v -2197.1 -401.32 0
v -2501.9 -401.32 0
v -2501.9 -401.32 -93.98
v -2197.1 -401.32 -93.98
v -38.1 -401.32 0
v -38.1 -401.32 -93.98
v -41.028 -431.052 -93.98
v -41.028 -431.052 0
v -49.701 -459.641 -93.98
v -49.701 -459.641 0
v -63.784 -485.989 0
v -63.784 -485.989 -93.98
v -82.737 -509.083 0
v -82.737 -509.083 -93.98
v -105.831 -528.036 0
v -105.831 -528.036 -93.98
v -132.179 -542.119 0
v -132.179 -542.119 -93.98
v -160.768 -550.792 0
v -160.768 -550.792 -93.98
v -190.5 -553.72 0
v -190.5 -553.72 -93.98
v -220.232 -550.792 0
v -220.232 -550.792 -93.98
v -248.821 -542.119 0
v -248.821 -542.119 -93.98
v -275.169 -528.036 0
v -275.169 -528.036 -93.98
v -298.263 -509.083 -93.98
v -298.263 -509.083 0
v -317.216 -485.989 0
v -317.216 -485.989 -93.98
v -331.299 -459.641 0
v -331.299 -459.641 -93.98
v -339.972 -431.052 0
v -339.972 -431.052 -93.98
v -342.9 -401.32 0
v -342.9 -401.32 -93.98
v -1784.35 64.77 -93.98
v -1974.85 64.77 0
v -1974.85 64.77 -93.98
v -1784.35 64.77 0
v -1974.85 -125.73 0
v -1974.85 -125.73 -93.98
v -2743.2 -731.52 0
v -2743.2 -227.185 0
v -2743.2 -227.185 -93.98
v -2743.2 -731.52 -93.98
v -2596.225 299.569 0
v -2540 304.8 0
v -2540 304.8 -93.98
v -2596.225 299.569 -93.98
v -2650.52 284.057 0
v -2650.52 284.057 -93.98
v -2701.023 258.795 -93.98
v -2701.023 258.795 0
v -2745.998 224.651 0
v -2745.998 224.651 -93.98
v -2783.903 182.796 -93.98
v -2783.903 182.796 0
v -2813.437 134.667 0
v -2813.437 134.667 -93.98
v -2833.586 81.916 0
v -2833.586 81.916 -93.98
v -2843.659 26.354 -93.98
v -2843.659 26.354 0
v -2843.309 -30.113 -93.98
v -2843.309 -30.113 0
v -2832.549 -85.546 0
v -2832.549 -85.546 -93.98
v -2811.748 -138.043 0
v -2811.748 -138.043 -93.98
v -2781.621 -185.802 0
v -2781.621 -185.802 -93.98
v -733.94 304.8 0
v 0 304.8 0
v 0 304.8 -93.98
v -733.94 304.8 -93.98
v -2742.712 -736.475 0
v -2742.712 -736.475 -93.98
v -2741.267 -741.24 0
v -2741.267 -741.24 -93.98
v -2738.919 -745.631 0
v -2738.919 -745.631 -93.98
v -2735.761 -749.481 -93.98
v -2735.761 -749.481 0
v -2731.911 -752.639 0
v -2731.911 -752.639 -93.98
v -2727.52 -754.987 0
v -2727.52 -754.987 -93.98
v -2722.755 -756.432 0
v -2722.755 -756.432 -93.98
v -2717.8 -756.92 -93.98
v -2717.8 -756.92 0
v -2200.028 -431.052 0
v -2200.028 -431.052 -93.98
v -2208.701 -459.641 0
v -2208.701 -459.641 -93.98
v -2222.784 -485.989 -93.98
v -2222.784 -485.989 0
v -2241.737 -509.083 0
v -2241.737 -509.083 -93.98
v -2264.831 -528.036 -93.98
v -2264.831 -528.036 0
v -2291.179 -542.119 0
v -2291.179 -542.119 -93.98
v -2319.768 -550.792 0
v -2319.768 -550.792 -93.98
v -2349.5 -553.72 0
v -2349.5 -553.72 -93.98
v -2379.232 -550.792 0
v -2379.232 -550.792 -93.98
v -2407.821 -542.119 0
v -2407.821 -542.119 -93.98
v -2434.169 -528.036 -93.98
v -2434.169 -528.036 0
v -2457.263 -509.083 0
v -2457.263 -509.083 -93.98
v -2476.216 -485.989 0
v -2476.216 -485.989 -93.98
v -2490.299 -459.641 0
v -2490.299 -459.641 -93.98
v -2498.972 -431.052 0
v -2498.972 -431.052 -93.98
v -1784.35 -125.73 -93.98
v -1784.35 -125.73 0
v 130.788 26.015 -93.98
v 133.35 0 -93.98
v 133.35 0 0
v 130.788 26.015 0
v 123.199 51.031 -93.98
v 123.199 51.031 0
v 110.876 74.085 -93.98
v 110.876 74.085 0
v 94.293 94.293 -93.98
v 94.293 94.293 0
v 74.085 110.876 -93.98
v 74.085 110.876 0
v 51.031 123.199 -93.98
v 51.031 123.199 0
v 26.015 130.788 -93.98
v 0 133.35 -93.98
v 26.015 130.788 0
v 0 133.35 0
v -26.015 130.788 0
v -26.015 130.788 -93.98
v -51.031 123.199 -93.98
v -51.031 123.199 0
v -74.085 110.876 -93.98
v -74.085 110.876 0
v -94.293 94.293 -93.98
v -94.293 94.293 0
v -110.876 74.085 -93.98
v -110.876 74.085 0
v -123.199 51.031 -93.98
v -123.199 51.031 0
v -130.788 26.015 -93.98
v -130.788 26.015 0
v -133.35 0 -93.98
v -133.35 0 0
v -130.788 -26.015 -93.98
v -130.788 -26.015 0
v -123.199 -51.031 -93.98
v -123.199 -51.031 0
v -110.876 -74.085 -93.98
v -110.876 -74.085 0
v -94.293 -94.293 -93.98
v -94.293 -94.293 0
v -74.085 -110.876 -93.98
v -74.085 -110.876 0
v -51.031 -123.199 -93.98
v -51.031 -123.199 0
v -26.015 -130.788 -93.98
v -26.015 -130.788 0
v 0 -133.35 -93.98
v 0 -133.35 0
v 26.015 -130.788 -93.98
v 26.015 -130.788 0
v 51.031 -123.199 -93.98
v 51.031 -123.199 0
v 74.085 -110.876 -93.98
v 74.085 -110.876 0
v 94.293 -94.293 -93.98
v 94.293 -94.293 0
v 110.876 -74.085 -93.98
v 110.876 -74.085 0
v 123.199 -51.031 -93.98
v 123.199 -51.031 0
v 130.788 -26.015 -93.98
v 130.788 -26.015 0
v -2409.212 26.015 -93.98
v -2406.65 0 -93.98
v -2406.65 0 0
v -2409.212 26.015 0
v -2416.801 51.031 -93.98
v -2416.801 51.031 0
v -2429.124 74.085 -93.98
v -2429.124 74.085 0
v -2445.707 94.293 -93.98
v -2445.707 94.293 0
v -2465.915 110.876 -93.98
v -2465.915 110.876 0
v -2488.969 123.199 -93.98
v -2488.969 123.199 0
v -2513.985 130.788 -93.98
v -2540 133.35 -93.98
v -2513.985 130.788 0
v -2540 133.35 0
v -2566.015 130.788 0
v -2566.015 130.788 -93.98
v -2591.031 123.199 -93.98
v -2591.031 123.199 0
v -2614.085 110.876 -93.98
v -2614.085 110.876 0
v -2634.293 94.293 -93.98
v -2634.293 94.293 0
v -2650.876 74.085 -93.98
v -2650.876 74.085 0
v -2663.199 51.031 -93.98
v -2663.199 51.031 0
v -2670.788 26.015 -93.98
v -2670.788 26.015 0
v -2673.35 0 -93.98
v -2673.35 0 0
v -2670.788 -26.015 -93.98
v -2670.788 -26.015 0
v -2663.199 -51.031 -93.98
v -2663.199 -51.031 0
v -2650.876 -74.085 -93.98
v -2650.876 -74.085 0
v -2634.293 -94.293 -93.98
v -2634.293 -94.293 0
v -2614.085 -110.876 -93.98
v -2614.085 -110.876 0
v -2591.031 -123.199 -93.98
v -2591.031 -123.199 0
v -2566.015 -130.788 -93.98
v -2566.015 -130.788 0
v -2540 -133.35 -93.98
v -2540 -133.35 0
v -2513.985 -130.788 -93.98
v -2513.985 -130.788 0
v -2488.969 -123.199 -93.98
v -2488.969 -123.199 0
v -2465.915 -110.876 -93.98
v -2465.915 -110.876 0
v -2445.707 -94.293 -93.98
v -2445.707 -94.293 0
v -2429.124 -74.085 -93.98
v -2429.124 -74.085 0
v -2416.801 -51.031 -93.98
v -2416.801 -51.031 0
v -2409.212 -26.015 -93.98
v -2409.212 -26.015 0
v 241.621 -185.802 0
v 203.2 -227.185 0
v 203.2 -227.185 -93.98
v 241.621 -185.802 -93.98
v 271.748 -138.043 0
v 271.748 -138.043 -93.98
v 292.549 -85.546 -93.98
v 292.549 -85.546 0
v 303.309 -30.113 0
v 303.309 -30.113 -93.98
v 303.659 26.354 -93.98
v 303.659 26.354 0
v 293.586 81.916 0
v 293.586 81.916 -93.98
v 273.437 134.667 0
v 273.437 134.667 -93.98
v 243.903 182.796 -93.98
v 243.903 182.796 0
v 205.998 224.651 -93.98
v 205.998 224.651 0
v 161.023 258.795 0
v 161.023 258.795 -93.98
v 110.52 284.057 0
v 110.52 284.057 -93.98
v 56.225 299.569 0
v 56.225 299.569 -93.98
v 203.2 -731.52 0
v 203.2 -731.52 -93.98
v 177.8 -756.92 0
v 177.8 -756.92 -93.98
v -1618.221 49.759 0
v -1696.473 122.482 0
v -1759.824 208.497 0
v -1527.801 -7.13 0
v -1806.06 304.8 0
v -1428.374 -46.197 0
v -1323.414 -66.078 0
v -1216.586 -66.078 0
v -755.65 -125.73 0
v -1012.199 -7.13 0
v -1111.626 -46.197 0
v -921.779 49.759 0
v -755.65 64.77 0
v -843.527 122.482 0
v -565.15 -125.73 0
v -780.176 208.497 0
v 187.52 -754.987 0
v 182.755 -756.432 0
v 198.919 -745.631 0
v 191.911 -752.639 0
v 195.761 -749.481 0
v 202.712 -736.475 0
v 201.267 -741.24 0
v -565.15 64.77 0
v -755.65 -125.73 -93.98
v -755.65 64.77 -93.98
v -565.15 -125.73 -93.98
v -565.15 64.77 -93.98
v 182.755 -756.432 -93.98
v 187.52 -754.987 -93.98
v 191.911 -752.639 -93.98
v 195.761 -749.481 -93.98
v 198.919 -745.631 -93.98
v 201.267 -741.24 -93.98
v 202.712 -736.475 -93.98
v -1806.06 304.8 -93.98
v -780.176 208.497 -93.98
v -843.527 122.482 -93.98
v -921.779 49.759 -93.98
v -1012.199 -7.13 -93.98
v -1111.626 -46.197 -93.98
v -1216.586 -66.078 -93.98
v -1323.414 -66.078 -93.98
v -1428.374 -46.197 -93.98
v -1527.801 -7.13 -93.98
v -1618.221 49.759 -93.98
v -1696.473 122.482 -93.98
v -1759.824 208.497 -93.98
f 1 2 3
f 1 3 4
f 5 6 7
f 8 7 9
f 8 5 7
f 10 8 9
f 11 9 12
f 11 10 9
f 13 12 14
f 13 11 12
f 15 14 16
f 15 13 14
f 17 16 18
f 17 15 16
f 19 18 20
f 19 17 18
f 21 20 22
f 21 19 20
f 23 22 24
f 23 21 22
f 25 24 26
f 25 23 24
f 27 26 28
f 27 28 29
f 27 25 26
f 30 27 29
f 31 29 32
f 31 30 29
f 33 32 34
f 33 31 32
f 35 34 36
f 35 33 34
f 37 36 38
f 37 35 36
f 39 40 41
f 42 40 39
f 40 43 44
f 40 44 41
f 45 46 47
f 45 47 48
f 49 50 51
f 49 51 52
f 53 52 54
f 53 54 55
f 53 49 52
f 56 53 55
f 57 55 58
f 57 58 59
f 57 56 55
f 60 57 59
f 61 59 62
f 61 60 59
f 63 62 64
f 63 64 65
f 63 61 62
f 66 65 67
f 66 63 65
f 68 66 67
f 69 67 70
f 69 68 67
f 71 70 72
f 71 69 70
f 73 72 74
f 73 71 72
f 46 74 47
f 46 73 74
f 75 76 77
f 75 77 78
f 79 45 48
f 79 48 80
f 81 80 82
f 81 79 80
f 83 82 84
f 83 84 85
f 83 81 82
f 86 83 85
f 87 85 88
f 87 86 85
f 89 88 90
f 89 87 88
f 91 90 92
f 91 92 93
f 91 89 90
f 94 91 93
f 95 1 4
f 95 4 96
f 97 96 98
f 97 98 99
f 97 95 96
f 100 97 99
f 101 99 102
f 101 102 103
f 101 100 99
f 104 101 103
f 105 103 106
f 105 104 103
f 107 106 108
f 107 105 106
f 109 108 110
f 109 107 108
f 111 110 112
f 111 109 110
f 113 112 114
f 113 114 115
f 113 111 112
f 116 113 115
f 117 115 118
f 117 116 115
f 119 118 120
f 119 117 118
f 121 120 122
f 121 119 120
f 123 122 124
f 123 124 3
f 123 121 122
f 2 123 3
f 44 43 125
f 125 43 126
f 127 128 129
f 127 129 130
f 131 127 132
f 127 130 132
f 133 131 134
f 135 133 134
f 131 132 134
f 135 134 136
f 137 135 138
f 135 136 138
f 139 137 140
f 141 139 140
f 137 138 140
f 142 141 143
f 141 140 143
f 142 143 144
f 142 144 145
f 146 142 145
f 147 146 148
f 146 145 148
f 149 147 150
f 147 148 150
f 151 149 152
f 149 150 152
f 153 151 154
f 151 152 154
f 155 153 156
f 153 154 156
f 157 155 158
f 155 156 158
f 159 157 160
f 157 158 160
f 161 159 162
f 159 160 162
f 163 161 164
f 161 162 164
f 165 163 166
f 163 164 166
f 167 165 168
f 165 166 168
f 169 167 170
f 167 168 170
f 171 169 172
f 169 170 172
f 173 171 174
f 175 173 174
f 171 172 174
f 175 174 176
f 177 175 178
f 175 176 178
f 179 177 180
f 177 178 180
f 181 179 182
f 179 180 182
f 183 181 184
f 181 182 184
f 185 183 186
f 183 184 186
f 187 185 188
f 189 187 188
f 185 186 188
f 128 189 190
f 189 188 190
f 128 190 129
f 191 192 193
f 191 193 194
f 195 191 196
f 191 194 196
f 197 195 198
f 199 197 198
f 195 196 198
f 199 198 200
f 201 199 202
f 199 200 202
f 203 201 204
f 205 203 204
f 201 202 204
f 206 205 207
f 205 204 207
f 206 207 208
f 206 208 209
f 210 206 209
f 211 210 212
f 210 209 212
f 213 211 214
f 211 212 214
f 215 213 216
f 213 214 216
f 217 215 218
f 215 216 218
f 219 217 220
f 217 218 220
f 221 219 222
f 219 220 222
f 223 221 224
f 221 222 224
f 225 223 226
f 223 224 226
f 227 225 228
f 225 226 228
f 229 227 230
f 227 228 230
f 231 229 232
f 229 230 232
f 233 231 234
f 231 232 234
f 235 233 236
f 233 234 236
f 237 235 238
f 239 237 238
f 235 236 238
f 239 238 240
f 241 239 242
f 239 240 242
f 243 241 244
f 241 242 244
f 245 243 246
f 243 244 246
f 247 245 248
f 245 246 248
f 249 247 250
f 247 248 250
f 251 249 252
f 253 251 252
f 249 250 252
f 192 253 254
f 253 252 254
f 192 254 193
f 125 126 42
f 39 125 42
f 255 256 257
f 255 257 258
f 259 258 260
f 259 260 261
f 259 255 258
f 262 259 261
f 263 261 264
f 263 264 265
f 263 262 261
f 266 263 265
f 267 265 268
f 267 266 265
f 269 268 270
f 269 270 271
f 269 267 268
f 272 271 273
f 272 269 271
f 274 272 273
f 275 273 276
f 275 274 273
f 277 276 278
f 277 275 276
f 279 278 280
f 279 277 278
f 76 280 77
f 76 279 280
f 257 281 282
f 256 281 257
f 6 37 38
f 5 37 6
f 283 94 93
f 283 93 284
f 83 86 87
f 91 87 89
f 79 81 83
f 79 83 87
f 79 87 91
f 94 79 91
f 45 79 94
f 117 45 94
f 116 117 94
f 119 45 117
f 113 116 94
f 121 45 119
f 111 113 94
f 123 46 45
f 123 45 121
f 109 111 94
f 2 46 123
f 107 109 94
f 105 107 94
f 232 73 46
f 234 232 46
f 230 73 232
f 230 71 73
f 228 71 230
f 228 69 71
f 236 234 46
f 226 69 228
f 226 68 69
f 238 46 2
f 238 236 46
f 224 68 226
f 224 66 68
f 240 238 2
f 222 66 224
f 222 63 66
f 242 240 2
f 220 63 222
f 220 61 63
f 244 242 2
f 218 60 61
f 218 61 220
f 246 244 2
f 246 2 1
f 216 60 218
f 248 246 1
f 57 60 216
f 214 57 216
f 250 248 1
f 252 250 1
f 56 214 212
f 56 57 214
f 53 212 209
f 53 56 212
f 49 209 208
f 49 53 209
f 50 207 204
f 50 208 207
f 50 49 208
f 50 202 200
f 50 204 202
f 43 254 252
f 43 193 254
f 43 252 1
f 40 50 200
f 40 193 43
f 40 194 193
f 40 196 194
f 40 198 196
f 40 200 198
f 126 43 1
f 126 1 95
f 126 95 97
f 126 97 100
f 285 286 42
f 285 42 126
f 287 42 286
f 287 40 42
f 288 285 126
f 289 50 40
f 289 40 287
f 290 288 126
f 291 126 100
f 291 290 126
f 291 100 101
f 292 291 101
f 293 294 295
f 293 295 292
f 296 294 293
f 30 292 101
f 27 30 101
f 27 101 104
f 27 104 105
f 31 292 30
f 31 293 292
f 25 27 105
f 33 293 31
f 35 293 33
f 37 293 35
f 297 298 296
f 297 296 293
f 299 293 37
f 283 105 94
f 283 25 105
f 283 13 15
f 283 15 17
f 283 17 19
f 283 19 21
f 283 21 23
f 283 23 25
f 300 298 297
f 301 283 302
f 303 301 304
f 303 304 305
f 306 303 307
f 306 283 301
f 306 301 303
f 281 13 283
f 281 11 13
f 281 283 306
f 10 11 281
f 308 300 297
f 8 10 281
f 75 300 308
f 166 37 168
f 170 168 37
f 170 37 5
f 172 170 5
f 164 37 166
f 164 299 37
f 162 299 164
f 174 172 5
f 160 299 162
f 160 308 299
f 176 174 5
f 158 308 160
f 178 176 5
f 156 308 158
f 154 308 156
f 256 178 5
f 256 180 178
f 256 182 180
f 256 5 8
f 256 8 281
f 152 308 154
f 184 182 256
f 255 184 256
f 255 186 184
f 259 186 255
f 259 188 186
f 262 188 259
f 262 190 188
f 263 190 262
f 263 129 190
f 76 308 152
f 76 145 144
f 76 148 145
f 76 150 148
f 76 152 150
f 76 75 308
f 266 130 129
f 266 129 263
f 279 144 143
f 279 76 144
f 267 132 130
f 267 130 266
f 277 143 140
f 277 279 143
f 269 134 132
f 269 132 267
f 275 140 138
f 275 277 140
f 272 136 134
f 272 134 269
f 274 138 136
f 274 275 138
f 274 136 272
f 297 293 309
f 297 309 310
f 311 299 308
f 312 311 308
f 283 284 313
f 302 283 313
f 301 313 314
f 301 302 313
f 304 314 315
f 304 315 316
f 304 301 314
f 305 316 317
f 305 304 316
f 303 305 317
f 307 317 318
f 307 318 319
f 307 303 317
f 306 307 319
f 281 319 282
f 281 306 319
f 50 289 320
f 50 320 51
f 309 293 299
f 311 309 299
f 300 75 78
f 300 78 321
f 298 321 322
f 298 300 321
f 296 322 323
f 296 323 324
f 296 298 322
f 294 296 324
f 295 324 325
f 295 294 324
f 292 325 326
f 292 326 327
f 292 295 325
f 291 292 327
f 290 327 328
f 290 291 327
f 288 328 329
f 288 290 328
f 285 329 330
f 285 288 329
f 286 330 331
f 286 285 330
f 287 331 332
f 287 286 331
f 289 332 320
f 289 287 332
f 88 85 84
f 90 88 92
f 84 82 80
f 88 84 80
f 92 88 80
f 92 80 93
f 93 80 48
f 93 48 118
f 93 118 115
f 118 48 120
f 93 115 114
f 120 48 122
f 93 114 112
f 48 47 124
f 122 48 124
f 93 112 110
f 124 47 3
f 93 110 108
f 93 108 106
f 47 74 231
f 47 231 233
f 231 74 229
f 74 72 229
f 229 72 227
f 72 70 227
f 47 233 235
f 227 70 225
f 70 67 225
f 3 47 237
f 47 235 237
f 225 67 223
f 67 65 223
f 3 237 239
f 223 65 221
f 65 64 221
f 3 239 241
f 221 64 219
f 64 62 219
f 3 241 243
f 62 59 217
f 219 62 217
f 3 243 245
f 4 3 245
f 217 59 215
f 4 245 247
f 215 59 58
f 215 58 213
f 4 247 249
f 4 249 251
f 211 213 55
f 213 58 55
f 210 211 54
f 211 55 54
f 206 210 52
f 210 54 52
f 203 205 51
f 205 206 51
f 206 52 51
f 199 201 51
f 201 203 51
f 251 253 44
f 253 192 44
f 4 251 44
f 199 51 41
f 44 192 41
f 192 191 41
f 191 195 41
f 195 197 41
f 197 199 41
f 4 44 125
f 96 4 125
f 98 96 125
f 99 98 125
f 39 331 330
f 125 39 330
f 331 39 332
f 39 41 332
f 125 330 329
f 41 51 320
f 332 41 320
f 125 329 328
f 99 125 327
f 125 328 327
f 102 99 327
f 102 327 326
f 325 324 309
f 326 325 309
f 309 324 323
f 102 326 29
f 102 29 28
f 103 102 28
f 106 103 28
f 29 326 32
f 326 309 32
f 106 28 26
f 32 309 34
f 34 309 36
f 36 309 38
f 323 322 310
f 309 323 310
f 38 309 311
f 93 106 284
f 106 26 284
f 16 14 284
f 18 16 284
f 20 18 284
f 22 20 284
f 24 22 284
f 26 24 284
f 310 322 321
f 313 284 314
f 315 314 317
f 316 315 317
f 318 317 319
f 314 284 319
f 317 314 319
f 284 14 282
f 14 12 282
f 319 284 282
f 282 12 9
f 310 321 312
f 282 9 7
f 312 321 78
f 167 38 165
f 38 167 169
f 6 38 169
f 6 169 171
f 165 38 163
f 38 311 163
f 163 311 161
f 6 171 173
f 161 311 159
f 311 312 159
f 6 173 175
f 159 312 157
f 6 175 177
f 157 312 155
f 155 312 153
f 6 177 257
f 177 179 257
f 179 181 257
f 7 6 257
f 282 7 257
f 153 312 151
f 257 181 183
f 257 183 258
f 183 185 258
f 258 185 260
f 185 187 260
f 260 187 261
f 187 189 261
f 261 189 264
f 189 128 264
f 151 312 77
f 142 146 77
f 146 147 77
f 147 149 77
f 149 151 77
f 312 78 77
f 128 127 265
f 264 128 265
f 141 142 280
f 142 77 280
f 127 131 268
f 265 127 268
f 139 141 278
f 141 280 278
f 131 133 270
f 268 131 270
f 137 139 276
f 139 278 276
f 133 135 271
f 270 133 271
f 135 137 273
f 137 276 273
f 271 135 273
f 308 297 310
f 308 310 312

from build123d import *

# Parameters (mm, degrees)
SKETCH1_R           = 133.35
SKETCH1_W           = 190.5
SKETCH1_H           = 190.5
BOSS_EXTRUDE1_DEPTH = 93.98


with BuildPart() as part:
    # Sketch1 → Boss-Extrude1 (new body)
    with BuildSketch(Plane.XY):
        with BuildLine():
            Line((-2743.2, -227.184506514), (-2743.2, -731.52))
            ThreePointArc((-2743.2, -731.52), (-2735.760512242, -749.480512242), (-2717.8, -756.92))
            Line((-2717.8, -756.92), (-2540, -756.92))
            Line((-2540, -756.92), (177.8, -756.92))
            ThreePointArc((177.8, -756.92), (195.760512242, -749.480512242), (203.2, -731.52))
            Line((203.2, -731.52), (203.2, -227.184506514))
            ThreePointArc((203.2, -227.184506514), (284.735735012, 108.759372963), (0, 304.8))
            Line((0, 304.8), (-733.939634369, 304.8))
            ThreePointArc((-733.939634369, 304.8), (-1270, -68.58), (-1806.060365631, 304.8))
            Line((-1806.060365631, 304.8), (-2540, 304.8))
            ThreePointArc((-2540, 304.8), (-2824.735735012, 108.759372963), (-2743.2, -227.184506514))
        make_face()
        with BuildLine():
            Line((-2501.9, -401.32), (-2197.1, -401.32))
            ThreePointArc((-2197.1, -401.32), (-2349.5, -553.72), (-2501.9, -401.32))
        make_face(mode=Mode.SUBTRACT)
        with BuildLine():
            Line((-342.9, -401.32), (-38.1, -401.32))
            ThreePointArc((-38.1, -401.32), (-190.5, -553.72), (-342.9, -401.32))
        make_face(mode=Mode.SUBTRACT)
        with Locations((-2540, 0)):
            Circle(SKETCH1_R, mode=Mode.SUBTRACT)
        with Locations((-1879.6, -30.48)):
            Rectangle(SKETCH1_W, SKETCH1_H, mode=Mode.SUBTRACT)
        with Locations((-660.4, -30.48)):
            Rectangle(SKETCH1_W, SKETCH1_H, mode=Mode.SUBTRACT)
        Circle(SKETCH1_R, mode=Mode.SUBTRACT)
    extrude(amount=-BOSS_EXTRUDE1_DEPTH)


solid = part.part
